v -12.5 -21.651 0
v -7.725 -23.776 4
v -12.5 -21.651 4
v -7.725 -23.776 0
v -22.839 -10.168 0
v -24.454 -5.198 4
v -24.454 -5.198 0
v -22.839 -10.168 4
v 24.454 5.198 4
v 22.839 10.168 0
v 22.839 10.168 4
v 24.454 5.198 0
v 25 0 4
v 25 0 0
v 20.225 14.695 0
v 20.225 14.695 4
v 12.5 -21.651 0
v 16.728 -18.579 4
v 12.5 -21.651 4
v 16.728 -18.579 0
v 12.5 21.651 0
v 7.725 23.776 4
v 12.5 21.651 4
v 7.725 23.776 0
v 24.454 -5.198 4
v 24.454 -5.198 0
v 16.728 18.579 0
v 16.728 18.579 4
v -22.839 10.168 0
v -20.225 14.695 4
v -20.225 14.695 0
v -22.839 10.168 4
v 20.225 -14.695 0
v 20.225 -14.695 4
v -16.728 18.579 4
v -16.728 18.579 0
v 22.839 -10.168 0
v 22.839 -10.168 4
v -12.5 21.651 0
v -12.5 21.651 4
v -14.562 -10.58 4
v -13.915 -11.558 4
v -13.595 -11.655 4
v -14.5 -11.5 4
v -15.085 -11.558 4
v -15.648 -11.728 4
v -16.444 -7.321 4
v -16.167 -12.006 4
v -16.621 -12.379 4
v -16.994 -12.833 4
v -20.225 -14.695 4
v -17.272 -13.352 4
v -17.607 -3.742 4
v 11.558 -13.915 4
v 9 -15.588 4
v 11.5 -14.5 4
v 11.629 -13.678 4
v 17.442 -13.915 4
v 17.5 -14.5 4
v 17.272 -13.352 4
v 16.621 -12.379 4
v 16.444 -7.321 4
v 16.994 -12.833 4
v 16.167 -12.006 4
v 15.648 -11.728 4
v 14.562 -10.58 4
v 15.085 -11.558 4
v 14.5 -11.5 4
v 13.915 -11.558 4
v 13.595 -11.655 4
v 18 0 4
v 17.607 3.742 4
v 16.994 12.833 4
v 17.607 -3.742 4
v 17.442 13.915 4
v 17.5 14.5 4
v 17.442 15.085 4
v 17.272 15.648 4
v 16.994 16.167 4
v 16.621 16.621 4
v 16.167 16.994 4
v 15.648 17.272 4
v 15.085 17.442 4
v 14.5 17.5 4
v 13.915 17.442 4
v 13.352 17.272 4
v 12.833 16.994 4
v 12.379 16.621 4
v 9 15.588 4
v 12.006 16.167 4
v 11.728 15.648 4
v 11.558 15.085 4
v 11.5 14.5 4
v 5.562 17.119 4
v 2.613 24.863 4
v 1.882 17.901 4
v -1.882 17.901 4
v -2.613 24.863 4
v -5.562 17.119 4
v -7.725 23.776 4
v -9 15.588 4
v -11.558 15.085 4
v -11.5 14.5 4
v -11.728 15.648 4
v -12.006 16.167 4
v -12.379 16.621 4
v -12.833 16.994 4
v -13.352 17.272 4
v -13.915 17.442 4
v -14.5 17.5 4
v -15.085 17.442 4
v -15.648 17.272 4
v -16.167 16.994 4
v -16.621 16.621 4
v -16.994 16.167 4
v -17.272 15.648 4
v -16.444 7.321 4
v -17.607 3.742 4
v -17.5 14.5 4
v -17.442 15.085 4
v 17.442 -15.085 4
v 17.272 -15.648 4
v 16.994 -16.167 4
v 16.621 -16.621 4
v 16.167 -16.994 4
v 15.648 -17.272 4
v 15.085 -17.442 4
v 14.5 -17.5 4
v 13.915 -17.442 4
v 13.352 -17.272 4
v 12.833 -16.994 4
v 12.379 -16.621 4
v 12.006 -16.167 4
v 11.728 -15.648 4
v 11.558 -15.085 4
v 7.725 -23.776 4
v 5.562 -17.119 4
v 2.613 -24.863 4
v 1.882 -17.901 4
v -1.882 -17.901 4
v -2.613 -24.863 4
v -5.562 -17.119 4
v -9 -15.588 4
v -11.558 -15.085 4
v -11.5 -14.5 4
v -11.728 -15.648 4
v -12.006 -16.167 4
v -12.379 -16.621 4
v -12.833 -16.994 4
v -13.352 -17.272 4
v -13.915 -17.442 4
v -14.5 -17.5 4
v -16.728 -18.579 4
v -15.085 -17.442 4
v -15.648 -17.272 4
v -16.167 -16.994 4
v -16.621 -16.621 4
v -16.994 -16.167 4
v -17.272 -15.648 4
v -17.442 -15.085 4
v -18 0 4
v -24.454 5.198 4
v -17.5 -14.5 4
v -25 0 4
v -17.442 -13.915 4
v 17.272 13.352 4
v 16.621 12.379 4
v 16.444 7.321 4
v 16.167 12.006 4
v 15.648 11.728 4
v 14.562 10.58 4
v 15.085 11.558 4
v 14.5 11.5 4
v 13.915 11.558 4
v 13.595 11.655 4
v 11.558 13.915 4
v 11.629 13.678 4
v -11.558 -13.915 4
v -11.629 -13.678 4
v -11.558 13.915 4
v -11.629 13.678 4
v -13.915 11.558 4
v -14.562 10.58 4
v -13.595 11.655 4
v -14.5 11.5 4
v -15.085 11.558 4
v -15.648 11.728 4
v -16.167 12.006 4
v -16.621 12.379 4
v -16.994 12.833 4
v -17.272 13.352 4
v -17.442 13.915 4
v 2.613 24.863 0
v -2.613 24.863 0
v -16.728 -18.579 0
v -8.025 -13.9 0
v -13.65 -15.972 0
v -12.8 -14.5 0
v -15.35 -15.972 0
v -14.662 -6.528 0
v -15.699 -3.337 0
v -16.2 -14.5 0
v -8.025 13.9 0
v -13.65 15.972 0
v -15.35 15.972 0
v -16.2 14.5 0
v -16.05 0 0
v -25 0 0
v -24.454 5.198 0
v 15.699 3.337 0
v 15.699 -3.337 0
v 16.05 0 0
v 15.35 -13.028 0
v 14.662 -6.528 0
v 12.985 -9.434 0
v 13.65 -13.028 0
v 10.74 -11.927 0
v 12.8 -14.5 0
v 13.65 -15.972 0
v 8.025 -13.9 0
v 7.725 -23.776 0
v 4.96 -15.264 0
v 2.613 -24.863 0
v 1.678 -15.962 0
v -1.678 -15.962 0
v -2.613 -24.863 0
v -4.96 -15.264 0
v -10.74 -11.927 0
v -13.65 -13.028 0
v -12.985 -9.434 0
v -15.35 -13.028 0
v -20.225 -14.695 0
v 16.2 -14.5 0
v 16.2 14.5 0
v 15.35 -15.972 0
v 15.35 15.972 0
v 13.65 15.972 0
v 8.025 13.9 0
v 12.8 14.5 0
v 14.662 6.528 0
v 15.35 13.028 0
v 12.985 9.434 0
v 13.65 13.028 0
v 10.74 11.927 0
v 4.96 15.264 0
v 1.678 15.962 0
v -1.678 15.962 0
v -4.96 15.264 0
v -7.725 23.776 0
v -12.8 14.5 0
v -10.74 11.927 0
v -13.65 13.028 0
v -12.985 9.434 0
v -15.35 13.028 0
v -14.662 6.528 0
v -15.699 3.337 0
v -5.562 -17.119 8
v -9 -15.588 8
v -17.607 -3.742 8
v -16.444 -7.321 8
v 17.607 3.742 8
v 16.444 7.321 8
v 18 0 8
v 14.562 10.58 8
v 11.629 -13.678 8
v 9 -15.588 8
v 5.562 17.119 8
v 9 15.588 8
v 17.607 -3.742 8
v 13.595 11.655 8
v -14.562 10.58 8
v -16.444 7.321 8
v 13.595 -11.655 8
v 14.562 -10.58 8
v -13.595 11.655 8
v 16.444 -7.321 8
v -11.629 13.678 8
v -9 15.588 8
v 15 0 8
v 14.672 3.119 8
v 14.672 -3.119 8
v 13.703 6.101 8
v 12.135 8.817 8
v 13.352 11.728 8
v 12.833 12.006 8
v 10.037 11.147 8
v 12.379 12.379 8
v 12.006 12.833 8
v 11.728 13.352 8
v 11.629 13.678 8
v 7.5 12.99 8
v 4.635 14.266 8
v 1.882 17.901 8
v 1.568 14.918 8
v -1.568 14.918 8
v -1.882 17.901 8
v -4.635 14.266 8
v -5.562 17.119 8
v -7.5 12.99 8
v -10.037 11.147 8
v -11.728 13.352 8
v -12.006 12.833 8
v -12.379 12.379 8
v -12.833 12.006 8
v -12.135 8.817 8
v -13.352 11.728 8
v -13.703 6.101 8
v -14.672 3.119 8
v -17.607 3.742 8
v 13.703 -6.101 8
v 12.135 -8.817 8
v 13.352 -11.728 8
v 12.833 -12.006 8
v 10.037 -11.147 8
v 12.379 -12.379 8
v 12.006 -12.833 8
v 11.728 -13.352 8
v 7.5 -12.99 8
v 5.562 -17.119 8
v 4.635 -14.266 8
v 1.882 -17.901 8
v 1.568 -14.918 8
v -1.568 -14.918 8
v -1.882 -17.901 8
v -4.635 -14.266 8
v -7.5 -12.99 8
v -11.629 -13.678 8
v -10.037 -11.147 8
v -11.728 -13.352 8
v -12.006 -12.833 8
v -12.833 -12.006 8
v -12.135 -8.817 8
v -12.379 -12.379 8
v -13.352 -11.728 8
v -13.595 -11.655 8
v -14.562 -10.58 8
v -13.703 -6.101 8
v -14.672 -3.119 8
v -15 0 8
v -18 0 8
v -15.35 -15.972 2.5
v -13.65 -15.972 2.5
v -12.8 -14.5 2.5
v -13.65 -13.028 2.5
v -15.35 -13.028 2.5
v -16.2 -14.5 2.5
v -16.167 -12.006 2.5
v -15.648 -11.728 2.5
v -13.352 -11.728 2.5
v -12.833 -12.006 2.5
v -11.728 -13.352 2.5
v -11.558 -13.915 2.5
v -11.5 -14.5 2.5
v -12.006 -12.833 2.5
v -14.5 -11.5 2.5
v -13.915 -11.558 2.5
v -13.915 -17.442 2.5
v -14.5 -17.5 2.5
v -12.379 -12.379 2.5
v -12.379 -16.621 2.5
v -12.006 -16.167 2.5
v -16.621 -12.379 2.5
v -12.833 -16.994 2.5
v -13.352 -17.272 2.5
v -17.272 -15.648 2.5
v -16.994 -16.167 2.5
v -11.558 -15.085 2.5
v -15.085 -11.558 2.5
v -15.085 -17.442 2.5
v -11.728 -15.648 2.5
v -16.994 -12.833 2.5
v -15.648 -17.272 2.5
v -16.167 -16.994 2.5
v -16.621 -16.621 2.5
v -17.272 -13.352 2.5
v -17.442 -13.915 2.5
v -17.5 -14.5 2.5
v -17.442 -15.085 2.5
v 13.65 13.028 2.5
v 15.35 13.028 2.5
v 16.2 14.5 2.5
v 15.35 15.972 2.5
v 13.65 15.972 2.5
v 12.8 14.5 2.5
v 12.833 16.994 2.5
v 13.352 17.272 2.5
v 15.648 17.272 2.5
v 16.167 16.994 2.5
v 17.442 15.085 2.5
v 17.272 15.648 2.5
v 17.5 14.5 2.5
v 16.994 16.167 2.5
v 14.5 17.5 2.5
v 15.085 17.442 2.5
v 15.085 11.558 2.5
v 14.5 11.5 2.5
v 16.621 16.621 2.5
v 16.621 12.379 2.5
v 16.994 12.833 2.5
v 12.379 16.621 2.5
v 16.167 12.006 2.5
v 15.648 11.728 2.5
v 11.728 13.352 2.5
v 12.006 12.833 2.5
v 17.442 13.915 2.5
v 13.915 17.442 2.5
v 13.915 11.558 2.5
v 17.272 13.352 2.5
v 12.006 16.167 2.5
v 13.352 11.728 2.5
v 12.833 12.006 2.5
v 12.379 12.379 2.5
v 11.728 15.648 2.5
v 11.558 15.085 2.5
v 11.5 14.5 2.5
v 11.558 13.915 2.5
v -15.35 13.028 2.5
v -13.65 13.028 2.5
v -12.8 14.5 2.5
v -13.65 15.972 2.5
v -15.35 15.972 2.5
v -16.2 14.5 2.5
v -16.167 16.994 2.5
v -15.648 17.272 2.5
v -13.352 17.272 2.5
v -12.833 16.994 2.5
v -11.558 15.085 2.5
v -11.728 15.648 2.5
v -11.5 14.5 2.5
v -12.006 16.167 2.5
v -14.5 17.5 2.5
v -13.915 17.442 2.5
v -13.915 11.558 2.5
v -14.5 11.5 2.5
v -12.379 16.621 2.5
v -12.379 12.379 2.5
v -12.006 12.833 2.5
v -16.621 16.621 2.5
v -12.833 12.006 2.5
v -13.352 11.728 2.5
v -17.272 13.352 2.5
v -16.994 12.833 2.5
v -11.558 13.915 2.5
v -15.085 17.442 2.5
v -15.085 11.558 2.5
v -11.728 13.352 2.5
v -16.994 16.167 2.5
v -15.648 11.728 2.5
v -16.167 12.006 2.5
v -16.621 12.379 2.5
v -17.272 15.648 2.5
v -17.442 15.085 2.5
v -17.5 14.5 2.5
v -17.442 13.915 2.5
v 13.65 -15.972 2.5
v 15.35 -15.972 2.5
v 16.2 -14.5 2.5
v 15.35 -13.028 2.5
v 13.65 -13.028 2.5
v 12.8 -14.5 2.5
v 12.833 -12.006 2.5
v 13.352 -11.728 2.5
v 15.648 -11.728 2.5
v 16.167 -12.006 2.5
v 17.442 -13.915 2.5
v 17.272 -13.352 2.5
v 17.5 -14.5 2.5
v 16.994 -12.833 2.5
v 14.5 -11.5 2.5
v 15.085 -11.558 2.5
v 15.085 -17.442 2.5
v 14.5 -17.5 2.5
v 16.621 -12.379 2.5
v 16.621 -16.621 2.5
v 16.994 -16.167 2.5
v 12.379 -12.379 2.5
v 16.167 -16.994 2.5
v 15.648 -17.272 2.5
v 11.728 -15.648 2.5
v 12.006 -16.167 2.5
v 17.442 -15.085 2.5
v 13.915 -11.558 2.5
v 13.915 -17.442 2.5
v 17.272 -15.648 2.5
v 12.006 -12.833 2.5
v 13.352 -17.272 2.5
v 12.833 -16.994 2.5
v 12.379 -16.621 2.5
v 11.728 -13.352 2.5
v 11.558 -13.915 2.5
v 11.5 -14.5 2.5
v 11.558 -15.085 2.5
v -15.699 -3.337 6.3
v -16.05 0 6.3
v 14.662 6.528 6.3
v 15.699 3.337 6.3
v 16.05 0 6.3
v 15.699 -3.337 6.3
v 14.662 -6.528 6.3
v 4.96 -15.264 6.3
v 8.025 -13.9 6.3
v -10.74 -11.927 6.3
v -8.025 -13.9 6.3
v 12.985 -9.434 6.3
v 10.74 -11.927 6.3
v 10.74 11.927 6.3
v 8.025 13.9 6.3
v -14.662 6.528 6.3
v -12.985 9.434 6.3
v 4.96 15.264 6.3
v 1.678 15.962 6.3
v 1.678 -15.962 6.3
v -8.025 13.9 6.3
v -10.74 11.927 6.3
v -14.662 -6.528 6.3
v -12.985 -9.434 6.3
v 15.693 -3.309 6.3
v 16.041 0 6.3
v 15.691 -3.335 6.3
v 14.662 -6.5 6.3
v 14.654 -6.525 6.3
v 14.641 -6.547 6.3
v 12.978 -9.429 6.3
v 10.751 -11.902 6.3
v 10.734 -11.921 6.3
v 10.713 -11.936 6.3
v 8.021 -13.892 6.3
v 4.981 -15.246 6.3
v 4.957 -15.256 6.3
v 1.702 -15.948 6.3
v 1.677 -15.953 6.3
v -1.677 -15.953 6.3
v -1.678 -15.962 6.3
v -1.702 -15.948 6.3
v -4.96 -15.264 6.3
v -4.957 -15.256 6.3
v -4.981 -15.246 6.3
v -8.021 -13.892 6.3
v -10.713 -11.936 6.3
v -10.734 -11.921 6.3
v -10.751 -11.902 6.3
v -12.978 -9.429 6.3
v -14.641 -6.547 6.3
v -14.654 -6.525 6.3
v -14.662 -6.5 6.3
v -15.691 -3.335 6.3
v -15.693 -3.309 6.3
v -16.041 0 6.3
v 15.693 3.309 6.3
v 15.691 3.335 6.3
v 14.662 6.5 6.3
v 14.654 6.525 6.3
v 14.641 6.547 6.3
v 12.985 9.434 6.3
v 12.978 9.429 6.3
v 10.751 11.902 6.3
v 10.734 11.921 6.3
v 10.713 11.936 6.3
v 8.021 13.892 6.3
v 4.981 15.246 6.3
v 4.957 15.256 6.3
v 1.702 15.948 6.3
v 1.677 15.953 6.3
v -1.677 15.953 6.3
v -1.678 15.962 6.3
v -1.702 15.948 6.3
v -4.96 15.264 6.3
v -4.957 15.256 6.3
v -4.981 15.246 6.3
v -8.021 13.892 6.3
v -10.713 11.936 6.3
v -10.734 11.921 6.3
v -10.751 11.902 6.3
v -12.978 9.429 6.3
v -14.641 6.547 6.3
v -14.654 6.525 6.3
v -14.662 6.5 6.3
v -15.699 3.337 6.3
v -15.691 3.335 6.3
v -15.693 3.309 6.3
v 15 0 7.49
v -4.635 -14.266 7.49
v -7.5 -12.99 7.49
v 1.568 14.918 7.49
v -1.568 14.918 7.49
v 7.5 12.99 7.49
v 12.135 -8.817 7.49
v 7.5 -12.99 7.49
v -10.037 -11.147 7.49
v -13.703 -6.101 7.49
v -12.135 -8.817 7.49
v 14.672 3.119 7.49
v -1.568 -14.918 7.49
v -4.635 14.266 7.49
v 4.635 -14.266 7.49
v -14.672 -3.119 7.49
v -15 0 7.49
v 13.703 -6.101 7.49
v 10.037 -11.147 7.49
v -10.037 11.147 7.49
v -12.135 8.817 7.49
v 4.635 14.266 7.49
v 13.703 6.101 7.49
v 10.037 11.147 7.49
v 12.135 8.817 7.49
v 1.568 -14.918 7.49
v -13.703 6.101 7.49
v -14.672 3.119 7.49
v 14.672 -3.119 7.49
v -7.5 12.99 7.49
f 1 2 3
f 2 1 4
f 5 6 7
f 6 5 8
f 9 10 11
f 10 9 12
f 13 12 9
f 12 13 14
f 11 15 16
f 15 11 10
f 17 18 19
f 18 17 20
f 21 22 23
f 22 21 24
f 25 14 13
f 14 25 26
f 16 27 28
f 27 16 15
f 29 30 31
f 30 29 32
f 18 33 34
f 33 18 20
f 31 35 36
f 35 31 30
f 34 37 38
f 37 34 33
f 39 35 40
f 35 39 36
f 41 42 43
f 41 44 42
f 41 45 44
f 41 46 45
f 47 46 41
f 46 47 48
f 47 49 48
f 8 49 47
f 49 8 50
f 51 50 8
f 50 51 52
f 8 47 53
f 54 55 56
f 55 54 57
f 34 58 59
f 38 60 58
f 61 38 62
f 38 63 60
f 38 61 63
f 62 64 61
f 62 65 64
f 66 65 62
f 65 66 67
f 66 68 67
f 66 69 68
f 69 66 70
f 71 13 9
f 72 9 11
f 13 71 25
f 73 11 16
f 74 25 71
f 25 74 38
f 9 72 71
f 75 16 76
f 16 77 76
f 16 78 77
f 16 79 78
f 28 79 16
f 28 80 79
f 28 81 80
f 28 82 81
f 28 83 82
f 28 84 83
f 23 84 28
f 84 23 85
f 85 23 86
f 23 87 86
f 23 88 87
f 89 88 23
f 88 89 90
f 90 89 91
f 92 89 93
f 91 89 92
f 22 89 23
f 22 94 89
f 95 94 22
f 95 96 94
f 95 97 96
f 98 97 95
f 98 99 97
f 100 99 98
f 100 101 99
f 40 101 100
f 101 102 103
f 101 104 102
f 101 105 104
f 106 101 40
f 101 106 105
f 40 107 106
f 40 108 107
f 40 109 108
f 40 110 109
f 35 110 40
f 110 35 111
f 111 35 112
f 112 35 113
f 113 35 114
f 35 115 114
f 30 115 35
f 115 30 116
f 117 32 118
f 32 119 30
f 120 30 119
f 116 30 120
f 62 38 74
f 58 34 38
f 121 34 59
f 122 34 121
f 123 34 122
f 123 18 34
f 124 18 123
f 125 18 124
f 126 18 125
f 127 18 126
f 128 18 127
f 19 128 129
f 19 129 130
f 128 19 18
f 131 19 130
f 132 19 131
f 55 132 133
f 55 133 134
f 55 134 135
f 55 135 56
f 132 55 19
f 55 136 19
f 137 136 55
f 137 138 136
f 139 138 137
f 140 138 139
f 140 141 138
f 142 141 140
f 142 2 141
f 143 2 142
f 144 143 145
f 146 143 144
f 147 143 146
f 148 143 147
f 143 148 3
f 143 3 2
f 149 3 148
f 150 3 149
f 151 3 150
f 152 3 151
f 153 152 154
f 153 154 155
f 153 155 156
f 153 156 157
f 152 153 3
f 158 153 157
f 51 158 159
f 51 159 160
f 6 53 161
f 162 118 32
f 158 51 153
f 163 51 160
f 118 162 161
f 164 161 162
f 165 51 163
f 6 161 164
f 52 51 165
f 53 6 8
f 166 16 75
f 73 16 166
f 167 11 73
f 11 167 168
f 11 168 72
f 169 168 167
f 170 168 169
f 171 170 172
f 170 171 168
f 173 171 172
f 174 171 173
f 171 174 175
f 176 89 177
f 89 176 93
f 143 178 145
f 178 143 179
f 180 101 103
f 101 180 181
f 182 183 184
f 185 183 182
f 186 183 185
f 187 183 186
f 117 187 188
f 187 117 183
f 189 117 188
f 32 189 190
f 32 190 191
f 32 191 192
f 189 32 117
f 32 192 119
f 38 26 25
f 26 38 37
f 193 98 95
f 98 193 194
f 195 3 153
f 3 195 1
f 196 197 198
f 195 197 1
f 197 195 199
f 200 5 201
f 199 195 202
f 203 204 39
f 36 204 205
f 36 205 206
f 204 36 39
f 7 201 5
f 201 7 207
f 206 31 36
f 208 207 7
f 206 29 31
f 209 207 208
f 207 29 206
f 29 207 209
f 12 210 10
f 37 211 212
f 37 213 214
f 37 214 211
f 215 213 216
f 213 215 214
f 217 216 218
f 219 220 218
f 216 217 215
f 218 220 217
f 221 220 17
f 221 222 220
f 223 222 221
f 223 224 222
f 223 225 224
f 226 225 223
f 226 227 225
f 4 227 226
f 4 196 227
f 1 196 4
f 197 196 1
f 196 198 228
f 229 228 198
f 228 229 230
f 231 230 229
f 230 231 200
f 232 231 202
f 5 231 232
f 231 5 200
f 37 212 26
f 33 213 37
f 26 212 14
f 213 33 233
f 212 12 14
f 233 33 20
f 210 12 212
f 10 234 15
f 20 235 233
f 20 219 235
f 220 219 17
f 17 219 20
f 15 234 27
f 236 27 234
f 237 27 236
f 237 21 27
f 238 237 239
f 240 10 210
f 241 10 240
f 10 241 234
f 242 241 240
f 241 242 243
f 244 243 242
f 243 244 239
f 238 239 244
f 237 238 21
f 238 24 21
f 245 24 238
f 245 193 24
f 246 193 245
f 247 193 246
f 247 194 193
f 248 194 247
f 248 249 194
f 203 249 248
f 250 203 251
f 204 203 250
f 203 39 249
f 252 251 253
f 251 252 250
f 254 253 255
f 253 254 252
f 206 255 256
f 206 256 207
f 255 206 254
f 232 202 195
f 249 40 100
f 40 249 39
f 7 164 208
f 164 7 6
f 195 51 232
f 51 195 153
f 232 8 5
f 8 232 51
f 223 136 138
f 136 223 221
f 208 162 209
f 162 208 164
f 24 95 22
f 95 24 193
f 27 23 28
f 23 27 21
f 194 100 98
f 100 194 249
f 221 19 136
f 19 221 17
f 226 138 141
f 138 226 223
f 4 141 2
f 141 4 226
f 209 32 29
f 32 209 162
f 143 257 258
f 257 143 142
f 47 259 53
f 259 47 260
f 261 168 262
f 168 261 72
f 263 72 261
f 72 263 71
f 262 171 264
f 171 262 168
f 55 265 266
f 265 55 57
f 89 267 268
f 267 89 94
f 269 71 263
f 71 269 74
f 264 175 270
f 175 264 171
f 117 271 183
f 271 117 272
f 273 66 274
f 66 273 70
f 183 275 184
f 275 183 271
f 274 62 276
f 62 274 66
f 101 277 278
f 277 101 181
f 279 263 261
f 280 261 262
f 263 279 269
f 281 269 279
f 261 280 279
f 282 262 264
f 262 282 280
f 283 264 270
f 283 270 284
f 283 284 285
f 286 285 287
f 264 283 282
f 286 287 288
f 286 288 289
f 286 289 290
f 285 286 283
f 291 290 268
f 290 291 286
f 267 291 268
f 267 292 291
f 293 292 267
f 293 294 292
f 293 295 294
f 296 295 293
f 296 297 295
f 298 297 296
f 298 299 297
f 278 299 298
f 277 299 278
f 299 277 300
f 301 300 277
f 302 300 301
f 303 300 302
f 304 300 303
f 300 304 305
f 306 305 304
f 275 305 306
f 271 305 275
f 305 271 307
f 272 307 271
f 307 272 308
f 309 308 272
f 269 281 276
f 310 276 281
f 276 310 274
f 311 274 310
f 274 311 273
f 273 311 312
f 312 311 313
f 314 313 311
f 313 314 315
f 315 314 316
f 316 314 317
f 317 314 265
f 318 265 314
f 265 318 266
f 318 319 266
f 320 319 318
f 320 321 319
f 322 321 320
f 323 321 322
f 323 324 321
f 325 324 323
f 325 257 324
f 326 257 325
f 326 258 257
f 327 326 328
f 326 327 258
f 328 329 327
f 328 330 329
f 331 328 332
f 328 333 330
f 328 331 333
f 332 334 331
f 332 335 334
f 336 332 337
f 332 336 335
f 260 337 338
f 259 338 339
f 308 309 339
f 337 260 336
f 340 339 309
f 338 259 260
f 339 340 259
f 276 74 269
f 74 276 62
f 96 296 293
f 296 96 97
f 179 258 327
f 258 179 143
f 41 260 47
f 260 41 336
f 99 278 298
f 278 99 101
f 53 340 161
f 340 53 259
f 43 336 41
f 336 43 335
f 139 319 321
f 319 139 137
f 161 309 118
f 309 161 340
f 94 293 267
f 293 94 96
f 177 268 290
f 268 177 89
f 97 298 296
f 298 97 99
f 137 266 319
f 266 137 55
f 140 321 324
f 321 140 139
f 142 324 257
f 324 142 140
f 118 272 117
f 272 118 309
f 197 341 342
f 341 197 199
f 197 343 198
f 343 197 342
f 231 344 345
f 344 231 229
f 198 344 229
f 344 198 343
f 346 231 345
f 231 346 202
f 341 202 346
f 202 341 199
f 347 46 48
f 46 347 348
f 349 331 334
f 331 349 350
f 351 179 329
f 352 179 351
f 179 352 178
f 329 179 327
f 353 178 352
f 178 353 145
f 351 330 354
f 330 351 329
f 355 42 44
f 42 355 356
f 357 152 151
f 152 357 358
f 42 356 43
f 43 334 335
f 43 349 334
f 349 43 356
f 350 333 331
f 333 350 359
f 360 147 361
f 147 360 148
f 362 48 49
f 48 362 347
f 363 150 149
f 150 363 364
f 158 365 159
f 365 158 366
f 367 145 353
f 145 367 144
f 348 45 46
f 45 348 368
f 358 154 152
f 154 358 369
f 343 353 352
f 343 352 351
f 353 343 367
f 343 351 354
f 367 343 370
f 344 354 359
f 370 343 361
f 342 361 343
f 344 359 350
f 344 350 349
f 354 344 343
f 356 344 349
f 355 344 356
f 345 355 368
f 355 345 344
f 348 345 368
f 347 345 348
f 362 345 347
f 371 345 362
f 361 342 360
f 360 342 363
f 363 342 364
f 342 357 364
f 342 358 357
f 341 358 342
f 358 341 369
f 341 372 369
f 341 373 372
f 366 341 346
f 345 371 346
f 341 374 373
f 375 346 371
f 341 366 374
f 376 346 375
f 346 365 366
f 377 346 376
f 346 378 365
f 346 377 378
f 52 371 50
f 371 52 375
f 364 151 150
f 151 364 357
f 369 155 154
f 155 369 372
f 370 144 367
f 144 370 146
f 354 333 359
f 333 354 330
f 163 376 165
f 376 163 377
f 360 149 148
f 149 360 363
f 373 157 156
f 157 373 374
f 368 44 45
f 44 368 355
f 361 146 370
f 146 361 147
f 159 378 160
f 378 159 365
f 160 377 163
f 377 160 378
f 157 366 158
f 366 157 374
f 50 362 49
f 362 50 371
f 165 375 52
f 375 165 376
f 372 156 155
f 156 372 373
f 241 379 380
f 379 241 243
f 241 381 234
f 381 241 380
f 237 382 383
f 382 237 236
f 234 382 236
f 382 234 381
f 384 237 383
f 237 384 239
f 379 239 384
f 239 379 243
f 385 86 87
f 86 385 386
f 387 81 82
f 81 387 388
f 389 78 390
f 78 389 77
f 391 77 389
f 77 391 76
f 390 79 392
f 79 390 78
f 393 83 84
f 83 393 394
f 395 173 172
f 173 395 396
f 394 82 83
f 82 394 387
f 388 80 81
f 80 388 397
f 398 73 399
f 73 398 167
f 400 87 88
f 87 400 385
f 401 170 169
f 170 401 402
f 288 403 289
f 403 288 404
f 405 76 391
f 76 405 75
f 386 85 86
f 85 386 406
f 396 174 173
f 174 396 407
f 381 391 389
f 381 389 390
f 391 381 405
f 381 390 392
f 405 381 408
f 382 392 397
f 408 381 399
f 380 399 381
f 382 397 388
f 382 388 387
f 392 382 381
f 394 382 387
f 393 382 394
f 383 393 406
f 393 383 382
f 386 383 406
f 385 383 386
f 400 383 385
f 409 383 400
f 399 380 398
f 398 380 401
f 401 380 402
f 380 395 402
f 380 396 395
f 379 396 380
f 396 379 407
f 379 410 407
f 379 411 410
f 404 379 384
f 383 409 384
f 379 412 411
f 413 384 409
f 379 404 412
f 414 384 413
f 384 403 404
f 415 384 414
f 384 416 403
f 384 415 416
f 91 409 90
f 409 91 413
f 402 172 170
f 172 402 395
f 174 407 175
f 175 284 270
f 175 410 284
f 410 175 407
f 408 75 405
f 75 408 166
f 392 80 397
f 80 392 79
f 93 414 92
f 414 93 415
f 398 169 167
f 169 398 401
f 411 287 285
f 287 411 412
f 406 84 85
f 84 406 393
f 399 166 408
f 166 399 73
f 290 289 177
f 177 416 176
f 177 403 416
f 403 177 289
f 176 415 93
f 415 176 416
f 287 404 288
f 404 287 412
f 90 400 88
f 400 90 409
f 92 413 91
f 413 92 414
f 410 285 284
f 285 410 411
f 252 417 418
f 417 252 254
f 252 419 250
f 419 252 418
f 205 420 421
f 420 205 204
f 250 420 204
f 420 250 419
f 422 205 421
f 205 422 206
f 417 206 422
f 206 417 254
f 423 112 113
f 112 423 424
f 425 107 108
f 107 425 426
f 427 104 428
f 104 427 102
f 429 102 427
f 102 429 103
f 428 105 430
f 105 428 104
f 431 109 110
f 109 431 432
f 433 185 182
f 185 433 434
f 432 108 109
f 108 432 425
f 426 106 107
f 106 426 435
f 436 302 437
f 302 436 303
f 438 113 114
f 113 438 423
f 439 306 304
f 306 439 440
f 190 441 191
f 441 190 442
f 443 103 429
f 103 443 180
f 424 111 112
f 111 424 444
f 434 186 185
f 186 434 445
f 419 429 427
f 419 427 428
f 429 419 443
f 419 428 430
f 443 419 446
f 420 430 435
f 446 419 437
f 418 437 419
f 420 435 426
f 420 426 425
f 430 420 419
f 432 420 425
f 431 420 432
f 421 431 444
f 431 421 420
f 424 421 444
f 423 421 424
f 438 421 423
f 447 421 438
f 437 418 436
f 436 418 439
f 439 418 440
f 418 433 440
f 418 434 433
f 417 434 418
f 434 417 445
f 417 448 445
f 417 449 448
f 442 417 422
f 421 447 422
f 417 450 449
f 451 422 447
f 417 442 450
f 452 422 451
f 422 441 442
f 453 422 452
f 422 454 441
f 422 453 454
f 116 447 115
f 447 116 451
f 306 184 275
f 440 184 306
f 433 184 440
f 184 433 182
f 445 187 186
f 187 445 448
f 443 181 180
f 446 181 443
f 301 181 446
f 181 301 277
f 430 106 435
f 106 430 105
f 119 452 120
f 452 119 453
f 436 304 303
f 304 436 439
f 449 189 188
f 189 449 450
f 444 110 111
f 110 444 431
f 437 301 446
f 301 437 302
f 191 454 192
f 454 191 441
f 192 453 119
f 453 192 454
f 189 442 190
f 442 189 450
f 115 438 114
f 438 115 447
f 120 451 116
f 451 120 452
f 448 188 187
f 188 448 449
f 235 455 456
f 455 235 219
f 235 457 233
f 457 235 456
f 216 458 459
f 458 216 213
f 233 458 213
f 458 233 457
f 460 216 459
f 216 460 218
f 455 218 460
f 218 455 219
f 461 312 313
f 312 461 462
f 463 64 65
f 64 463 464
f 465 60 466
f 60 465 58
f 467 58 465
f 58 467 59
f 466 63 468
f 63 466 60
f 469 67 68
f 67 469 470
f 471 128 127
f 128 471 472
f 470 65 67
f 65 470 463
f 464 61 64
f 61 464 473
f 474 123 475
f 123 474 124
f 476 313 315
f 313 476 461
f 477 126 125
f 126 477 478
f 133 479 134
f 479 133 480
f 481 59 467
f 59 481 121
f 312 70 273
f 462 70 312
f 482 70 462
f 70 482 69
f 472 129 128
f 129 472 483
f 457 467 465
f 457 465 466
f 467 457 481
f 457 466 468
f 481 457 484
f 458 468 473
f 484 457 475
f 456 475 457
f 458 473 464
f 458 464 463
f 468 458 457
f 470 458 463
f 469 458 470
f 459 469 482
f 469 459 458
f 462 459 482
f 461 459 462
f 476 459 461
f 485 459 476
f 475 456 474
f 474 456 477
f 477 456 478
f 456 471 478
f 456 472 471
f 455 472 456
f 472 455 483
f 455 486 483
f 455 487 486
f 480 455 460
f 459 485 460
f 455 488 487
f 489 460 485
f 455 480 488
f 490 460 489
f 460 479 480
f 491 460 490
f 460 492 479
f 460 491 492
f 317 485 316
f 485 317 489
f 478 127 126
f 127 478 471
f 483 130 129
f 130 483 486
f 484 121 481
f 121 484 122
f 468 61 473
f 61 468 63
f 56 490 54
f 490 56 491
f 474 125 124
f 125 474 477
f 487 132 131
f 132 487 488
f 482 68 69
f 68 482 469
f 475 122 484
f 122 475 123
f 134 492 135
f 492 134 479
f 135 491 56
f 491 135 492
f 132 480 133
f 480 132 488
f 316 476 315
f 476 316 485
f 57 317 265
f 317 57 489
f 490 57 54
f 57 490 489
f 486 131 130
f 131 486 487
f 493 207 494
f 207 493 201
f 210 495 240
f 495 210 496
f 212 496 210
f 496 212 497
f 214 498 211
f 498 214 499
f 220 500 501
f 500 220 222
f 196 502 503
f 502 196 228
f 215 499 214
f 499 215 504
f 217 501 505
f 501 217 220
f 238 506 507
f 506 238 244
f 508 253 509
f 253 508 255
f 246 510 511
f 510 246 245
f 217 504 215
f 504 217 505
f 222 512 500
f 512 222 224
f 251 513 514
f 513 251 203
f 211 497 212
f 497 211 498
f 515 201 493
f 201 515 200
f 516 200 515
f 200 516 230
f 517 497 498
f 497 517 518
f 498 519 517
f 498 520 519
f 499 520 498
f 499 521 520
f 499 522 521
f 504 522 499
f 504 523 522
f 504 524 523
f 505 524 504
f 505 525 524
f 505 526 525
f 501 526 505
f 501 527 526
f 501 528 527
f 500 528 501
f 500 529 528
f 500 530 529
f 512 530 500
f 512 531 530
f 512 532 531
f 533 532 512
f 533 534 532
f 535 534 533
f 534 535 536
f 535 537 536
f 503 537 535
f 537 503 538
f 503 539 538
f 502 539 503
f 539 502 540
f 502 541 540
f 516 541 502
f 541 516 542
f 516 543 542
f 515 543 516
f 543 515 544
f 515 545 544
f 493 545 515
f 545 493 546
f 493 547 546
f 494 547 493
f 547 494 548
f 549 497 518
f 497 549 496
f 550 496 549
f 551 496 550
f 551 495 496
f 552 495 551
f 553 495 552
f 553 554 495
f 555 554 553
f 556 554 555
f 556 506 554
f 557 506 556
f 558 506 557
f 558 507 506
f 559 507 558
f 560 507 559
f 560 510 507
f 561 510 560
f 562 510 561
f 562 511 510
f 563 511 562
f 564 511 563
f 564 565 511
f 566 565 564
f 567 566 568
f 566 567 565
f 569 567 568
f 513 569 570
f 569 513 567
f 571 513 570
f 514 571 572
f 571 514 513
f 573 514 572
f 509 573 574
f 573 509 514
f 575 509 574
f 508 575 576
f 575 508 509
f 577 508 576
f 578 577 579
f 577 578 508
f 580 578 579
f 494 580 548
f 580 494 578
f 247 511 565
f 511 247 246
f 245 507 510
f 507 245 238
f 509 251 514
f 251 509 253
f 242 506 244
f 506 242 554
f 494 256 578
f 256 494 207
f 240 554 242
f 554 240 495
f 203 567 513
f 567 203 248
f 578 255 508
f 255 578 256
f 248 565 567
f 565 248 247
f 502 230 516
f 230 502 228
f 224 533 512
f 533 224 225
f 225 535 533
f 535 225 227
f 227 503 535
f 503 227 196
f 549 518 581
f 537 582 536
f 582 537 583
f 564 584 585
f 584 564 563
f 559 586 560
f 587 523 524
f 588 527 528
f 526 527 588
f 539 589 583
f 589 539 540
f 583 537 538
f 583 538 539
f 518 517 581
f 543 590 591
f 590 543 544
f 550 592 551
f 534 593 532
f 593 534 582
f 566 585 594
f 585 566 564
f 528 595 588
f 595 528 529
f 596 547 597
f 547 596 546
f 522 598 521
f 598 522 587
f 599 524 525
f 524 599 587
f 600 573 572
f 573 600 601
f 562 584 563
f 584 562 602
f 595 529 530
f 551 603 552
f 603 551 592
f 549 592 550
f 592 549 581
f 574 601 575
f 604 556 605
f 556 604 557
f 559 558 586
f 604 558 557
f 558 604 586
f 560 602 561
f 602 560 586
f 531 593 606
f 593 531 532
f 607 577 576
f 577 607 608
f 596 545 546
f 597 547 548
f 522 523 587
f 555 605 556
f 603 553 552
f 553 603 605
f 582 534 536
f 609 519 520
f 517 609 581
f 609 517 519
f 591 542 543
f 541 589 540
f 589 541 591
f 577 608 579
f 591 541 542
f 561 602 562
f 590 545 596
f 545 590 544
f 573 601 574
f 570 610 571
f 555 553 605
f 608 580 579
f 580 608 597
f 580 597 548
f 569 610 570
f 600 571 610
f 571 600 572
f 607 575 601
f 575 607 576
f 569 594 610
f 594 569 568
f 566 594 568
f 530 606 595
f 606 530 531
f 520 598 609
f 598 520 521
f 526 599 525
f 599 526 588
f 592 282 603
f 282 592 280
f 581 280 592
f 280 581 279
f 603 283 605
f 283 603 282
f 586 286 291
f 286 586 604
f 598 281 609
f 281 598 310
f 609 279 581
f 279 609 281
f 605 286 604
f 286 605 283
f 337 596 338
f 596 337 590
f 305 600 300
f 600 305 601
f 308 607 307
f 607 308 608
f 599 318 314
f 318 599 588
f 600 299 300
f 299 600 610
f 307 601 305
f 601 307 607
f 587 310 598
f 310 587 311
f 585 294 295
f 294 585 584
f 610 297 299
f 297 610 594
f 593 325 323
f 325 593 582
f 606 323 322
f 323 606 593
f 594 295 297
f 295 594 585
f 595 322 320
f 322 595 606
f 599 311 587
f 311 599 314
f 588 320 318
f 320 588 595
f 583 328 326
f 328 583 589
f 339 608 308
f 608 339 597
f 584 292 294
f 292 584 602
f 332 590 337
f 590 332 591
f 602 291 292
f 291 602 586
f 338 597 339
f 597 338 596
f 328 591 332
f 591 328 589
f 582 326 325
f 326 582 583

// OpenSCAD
seat6804();

module seat6804() {
  difference($fn=256) {
    union() {
      cylinder(d=50,h=4); // brim
      cylinder(d=36,h=8);
    }
    translate([0,0,-1]) cylinder(d=32.1,h=7.3); // bearing
    translate([0,0,6.29]) cylinder(d1=32.1,d2=30,h=1.2); // limiter
    translate([0,0,-1.2]) cylinder(d=30,h=20); // limiter
    screws();
  }
  *%nsk6804();
}


module screws() {
  screw([-14.5,-14.5]);
  screw([14.5,14.5]);
  screw([-14.5,14.5]);
  screw([14.5,-14.5]);
}

module screw(pos) {
  translate(pos) {
    translate([0,0,-1]) cylinder(d=3.4,h=11);
    translate([0,0,2.5]) cylinder(d=6,h=11,$fn=32);
  }
}

module nsk6804() {
  rotate([0,90,0]) resize([7,32,32]) import("nsk6804.stl");
}
